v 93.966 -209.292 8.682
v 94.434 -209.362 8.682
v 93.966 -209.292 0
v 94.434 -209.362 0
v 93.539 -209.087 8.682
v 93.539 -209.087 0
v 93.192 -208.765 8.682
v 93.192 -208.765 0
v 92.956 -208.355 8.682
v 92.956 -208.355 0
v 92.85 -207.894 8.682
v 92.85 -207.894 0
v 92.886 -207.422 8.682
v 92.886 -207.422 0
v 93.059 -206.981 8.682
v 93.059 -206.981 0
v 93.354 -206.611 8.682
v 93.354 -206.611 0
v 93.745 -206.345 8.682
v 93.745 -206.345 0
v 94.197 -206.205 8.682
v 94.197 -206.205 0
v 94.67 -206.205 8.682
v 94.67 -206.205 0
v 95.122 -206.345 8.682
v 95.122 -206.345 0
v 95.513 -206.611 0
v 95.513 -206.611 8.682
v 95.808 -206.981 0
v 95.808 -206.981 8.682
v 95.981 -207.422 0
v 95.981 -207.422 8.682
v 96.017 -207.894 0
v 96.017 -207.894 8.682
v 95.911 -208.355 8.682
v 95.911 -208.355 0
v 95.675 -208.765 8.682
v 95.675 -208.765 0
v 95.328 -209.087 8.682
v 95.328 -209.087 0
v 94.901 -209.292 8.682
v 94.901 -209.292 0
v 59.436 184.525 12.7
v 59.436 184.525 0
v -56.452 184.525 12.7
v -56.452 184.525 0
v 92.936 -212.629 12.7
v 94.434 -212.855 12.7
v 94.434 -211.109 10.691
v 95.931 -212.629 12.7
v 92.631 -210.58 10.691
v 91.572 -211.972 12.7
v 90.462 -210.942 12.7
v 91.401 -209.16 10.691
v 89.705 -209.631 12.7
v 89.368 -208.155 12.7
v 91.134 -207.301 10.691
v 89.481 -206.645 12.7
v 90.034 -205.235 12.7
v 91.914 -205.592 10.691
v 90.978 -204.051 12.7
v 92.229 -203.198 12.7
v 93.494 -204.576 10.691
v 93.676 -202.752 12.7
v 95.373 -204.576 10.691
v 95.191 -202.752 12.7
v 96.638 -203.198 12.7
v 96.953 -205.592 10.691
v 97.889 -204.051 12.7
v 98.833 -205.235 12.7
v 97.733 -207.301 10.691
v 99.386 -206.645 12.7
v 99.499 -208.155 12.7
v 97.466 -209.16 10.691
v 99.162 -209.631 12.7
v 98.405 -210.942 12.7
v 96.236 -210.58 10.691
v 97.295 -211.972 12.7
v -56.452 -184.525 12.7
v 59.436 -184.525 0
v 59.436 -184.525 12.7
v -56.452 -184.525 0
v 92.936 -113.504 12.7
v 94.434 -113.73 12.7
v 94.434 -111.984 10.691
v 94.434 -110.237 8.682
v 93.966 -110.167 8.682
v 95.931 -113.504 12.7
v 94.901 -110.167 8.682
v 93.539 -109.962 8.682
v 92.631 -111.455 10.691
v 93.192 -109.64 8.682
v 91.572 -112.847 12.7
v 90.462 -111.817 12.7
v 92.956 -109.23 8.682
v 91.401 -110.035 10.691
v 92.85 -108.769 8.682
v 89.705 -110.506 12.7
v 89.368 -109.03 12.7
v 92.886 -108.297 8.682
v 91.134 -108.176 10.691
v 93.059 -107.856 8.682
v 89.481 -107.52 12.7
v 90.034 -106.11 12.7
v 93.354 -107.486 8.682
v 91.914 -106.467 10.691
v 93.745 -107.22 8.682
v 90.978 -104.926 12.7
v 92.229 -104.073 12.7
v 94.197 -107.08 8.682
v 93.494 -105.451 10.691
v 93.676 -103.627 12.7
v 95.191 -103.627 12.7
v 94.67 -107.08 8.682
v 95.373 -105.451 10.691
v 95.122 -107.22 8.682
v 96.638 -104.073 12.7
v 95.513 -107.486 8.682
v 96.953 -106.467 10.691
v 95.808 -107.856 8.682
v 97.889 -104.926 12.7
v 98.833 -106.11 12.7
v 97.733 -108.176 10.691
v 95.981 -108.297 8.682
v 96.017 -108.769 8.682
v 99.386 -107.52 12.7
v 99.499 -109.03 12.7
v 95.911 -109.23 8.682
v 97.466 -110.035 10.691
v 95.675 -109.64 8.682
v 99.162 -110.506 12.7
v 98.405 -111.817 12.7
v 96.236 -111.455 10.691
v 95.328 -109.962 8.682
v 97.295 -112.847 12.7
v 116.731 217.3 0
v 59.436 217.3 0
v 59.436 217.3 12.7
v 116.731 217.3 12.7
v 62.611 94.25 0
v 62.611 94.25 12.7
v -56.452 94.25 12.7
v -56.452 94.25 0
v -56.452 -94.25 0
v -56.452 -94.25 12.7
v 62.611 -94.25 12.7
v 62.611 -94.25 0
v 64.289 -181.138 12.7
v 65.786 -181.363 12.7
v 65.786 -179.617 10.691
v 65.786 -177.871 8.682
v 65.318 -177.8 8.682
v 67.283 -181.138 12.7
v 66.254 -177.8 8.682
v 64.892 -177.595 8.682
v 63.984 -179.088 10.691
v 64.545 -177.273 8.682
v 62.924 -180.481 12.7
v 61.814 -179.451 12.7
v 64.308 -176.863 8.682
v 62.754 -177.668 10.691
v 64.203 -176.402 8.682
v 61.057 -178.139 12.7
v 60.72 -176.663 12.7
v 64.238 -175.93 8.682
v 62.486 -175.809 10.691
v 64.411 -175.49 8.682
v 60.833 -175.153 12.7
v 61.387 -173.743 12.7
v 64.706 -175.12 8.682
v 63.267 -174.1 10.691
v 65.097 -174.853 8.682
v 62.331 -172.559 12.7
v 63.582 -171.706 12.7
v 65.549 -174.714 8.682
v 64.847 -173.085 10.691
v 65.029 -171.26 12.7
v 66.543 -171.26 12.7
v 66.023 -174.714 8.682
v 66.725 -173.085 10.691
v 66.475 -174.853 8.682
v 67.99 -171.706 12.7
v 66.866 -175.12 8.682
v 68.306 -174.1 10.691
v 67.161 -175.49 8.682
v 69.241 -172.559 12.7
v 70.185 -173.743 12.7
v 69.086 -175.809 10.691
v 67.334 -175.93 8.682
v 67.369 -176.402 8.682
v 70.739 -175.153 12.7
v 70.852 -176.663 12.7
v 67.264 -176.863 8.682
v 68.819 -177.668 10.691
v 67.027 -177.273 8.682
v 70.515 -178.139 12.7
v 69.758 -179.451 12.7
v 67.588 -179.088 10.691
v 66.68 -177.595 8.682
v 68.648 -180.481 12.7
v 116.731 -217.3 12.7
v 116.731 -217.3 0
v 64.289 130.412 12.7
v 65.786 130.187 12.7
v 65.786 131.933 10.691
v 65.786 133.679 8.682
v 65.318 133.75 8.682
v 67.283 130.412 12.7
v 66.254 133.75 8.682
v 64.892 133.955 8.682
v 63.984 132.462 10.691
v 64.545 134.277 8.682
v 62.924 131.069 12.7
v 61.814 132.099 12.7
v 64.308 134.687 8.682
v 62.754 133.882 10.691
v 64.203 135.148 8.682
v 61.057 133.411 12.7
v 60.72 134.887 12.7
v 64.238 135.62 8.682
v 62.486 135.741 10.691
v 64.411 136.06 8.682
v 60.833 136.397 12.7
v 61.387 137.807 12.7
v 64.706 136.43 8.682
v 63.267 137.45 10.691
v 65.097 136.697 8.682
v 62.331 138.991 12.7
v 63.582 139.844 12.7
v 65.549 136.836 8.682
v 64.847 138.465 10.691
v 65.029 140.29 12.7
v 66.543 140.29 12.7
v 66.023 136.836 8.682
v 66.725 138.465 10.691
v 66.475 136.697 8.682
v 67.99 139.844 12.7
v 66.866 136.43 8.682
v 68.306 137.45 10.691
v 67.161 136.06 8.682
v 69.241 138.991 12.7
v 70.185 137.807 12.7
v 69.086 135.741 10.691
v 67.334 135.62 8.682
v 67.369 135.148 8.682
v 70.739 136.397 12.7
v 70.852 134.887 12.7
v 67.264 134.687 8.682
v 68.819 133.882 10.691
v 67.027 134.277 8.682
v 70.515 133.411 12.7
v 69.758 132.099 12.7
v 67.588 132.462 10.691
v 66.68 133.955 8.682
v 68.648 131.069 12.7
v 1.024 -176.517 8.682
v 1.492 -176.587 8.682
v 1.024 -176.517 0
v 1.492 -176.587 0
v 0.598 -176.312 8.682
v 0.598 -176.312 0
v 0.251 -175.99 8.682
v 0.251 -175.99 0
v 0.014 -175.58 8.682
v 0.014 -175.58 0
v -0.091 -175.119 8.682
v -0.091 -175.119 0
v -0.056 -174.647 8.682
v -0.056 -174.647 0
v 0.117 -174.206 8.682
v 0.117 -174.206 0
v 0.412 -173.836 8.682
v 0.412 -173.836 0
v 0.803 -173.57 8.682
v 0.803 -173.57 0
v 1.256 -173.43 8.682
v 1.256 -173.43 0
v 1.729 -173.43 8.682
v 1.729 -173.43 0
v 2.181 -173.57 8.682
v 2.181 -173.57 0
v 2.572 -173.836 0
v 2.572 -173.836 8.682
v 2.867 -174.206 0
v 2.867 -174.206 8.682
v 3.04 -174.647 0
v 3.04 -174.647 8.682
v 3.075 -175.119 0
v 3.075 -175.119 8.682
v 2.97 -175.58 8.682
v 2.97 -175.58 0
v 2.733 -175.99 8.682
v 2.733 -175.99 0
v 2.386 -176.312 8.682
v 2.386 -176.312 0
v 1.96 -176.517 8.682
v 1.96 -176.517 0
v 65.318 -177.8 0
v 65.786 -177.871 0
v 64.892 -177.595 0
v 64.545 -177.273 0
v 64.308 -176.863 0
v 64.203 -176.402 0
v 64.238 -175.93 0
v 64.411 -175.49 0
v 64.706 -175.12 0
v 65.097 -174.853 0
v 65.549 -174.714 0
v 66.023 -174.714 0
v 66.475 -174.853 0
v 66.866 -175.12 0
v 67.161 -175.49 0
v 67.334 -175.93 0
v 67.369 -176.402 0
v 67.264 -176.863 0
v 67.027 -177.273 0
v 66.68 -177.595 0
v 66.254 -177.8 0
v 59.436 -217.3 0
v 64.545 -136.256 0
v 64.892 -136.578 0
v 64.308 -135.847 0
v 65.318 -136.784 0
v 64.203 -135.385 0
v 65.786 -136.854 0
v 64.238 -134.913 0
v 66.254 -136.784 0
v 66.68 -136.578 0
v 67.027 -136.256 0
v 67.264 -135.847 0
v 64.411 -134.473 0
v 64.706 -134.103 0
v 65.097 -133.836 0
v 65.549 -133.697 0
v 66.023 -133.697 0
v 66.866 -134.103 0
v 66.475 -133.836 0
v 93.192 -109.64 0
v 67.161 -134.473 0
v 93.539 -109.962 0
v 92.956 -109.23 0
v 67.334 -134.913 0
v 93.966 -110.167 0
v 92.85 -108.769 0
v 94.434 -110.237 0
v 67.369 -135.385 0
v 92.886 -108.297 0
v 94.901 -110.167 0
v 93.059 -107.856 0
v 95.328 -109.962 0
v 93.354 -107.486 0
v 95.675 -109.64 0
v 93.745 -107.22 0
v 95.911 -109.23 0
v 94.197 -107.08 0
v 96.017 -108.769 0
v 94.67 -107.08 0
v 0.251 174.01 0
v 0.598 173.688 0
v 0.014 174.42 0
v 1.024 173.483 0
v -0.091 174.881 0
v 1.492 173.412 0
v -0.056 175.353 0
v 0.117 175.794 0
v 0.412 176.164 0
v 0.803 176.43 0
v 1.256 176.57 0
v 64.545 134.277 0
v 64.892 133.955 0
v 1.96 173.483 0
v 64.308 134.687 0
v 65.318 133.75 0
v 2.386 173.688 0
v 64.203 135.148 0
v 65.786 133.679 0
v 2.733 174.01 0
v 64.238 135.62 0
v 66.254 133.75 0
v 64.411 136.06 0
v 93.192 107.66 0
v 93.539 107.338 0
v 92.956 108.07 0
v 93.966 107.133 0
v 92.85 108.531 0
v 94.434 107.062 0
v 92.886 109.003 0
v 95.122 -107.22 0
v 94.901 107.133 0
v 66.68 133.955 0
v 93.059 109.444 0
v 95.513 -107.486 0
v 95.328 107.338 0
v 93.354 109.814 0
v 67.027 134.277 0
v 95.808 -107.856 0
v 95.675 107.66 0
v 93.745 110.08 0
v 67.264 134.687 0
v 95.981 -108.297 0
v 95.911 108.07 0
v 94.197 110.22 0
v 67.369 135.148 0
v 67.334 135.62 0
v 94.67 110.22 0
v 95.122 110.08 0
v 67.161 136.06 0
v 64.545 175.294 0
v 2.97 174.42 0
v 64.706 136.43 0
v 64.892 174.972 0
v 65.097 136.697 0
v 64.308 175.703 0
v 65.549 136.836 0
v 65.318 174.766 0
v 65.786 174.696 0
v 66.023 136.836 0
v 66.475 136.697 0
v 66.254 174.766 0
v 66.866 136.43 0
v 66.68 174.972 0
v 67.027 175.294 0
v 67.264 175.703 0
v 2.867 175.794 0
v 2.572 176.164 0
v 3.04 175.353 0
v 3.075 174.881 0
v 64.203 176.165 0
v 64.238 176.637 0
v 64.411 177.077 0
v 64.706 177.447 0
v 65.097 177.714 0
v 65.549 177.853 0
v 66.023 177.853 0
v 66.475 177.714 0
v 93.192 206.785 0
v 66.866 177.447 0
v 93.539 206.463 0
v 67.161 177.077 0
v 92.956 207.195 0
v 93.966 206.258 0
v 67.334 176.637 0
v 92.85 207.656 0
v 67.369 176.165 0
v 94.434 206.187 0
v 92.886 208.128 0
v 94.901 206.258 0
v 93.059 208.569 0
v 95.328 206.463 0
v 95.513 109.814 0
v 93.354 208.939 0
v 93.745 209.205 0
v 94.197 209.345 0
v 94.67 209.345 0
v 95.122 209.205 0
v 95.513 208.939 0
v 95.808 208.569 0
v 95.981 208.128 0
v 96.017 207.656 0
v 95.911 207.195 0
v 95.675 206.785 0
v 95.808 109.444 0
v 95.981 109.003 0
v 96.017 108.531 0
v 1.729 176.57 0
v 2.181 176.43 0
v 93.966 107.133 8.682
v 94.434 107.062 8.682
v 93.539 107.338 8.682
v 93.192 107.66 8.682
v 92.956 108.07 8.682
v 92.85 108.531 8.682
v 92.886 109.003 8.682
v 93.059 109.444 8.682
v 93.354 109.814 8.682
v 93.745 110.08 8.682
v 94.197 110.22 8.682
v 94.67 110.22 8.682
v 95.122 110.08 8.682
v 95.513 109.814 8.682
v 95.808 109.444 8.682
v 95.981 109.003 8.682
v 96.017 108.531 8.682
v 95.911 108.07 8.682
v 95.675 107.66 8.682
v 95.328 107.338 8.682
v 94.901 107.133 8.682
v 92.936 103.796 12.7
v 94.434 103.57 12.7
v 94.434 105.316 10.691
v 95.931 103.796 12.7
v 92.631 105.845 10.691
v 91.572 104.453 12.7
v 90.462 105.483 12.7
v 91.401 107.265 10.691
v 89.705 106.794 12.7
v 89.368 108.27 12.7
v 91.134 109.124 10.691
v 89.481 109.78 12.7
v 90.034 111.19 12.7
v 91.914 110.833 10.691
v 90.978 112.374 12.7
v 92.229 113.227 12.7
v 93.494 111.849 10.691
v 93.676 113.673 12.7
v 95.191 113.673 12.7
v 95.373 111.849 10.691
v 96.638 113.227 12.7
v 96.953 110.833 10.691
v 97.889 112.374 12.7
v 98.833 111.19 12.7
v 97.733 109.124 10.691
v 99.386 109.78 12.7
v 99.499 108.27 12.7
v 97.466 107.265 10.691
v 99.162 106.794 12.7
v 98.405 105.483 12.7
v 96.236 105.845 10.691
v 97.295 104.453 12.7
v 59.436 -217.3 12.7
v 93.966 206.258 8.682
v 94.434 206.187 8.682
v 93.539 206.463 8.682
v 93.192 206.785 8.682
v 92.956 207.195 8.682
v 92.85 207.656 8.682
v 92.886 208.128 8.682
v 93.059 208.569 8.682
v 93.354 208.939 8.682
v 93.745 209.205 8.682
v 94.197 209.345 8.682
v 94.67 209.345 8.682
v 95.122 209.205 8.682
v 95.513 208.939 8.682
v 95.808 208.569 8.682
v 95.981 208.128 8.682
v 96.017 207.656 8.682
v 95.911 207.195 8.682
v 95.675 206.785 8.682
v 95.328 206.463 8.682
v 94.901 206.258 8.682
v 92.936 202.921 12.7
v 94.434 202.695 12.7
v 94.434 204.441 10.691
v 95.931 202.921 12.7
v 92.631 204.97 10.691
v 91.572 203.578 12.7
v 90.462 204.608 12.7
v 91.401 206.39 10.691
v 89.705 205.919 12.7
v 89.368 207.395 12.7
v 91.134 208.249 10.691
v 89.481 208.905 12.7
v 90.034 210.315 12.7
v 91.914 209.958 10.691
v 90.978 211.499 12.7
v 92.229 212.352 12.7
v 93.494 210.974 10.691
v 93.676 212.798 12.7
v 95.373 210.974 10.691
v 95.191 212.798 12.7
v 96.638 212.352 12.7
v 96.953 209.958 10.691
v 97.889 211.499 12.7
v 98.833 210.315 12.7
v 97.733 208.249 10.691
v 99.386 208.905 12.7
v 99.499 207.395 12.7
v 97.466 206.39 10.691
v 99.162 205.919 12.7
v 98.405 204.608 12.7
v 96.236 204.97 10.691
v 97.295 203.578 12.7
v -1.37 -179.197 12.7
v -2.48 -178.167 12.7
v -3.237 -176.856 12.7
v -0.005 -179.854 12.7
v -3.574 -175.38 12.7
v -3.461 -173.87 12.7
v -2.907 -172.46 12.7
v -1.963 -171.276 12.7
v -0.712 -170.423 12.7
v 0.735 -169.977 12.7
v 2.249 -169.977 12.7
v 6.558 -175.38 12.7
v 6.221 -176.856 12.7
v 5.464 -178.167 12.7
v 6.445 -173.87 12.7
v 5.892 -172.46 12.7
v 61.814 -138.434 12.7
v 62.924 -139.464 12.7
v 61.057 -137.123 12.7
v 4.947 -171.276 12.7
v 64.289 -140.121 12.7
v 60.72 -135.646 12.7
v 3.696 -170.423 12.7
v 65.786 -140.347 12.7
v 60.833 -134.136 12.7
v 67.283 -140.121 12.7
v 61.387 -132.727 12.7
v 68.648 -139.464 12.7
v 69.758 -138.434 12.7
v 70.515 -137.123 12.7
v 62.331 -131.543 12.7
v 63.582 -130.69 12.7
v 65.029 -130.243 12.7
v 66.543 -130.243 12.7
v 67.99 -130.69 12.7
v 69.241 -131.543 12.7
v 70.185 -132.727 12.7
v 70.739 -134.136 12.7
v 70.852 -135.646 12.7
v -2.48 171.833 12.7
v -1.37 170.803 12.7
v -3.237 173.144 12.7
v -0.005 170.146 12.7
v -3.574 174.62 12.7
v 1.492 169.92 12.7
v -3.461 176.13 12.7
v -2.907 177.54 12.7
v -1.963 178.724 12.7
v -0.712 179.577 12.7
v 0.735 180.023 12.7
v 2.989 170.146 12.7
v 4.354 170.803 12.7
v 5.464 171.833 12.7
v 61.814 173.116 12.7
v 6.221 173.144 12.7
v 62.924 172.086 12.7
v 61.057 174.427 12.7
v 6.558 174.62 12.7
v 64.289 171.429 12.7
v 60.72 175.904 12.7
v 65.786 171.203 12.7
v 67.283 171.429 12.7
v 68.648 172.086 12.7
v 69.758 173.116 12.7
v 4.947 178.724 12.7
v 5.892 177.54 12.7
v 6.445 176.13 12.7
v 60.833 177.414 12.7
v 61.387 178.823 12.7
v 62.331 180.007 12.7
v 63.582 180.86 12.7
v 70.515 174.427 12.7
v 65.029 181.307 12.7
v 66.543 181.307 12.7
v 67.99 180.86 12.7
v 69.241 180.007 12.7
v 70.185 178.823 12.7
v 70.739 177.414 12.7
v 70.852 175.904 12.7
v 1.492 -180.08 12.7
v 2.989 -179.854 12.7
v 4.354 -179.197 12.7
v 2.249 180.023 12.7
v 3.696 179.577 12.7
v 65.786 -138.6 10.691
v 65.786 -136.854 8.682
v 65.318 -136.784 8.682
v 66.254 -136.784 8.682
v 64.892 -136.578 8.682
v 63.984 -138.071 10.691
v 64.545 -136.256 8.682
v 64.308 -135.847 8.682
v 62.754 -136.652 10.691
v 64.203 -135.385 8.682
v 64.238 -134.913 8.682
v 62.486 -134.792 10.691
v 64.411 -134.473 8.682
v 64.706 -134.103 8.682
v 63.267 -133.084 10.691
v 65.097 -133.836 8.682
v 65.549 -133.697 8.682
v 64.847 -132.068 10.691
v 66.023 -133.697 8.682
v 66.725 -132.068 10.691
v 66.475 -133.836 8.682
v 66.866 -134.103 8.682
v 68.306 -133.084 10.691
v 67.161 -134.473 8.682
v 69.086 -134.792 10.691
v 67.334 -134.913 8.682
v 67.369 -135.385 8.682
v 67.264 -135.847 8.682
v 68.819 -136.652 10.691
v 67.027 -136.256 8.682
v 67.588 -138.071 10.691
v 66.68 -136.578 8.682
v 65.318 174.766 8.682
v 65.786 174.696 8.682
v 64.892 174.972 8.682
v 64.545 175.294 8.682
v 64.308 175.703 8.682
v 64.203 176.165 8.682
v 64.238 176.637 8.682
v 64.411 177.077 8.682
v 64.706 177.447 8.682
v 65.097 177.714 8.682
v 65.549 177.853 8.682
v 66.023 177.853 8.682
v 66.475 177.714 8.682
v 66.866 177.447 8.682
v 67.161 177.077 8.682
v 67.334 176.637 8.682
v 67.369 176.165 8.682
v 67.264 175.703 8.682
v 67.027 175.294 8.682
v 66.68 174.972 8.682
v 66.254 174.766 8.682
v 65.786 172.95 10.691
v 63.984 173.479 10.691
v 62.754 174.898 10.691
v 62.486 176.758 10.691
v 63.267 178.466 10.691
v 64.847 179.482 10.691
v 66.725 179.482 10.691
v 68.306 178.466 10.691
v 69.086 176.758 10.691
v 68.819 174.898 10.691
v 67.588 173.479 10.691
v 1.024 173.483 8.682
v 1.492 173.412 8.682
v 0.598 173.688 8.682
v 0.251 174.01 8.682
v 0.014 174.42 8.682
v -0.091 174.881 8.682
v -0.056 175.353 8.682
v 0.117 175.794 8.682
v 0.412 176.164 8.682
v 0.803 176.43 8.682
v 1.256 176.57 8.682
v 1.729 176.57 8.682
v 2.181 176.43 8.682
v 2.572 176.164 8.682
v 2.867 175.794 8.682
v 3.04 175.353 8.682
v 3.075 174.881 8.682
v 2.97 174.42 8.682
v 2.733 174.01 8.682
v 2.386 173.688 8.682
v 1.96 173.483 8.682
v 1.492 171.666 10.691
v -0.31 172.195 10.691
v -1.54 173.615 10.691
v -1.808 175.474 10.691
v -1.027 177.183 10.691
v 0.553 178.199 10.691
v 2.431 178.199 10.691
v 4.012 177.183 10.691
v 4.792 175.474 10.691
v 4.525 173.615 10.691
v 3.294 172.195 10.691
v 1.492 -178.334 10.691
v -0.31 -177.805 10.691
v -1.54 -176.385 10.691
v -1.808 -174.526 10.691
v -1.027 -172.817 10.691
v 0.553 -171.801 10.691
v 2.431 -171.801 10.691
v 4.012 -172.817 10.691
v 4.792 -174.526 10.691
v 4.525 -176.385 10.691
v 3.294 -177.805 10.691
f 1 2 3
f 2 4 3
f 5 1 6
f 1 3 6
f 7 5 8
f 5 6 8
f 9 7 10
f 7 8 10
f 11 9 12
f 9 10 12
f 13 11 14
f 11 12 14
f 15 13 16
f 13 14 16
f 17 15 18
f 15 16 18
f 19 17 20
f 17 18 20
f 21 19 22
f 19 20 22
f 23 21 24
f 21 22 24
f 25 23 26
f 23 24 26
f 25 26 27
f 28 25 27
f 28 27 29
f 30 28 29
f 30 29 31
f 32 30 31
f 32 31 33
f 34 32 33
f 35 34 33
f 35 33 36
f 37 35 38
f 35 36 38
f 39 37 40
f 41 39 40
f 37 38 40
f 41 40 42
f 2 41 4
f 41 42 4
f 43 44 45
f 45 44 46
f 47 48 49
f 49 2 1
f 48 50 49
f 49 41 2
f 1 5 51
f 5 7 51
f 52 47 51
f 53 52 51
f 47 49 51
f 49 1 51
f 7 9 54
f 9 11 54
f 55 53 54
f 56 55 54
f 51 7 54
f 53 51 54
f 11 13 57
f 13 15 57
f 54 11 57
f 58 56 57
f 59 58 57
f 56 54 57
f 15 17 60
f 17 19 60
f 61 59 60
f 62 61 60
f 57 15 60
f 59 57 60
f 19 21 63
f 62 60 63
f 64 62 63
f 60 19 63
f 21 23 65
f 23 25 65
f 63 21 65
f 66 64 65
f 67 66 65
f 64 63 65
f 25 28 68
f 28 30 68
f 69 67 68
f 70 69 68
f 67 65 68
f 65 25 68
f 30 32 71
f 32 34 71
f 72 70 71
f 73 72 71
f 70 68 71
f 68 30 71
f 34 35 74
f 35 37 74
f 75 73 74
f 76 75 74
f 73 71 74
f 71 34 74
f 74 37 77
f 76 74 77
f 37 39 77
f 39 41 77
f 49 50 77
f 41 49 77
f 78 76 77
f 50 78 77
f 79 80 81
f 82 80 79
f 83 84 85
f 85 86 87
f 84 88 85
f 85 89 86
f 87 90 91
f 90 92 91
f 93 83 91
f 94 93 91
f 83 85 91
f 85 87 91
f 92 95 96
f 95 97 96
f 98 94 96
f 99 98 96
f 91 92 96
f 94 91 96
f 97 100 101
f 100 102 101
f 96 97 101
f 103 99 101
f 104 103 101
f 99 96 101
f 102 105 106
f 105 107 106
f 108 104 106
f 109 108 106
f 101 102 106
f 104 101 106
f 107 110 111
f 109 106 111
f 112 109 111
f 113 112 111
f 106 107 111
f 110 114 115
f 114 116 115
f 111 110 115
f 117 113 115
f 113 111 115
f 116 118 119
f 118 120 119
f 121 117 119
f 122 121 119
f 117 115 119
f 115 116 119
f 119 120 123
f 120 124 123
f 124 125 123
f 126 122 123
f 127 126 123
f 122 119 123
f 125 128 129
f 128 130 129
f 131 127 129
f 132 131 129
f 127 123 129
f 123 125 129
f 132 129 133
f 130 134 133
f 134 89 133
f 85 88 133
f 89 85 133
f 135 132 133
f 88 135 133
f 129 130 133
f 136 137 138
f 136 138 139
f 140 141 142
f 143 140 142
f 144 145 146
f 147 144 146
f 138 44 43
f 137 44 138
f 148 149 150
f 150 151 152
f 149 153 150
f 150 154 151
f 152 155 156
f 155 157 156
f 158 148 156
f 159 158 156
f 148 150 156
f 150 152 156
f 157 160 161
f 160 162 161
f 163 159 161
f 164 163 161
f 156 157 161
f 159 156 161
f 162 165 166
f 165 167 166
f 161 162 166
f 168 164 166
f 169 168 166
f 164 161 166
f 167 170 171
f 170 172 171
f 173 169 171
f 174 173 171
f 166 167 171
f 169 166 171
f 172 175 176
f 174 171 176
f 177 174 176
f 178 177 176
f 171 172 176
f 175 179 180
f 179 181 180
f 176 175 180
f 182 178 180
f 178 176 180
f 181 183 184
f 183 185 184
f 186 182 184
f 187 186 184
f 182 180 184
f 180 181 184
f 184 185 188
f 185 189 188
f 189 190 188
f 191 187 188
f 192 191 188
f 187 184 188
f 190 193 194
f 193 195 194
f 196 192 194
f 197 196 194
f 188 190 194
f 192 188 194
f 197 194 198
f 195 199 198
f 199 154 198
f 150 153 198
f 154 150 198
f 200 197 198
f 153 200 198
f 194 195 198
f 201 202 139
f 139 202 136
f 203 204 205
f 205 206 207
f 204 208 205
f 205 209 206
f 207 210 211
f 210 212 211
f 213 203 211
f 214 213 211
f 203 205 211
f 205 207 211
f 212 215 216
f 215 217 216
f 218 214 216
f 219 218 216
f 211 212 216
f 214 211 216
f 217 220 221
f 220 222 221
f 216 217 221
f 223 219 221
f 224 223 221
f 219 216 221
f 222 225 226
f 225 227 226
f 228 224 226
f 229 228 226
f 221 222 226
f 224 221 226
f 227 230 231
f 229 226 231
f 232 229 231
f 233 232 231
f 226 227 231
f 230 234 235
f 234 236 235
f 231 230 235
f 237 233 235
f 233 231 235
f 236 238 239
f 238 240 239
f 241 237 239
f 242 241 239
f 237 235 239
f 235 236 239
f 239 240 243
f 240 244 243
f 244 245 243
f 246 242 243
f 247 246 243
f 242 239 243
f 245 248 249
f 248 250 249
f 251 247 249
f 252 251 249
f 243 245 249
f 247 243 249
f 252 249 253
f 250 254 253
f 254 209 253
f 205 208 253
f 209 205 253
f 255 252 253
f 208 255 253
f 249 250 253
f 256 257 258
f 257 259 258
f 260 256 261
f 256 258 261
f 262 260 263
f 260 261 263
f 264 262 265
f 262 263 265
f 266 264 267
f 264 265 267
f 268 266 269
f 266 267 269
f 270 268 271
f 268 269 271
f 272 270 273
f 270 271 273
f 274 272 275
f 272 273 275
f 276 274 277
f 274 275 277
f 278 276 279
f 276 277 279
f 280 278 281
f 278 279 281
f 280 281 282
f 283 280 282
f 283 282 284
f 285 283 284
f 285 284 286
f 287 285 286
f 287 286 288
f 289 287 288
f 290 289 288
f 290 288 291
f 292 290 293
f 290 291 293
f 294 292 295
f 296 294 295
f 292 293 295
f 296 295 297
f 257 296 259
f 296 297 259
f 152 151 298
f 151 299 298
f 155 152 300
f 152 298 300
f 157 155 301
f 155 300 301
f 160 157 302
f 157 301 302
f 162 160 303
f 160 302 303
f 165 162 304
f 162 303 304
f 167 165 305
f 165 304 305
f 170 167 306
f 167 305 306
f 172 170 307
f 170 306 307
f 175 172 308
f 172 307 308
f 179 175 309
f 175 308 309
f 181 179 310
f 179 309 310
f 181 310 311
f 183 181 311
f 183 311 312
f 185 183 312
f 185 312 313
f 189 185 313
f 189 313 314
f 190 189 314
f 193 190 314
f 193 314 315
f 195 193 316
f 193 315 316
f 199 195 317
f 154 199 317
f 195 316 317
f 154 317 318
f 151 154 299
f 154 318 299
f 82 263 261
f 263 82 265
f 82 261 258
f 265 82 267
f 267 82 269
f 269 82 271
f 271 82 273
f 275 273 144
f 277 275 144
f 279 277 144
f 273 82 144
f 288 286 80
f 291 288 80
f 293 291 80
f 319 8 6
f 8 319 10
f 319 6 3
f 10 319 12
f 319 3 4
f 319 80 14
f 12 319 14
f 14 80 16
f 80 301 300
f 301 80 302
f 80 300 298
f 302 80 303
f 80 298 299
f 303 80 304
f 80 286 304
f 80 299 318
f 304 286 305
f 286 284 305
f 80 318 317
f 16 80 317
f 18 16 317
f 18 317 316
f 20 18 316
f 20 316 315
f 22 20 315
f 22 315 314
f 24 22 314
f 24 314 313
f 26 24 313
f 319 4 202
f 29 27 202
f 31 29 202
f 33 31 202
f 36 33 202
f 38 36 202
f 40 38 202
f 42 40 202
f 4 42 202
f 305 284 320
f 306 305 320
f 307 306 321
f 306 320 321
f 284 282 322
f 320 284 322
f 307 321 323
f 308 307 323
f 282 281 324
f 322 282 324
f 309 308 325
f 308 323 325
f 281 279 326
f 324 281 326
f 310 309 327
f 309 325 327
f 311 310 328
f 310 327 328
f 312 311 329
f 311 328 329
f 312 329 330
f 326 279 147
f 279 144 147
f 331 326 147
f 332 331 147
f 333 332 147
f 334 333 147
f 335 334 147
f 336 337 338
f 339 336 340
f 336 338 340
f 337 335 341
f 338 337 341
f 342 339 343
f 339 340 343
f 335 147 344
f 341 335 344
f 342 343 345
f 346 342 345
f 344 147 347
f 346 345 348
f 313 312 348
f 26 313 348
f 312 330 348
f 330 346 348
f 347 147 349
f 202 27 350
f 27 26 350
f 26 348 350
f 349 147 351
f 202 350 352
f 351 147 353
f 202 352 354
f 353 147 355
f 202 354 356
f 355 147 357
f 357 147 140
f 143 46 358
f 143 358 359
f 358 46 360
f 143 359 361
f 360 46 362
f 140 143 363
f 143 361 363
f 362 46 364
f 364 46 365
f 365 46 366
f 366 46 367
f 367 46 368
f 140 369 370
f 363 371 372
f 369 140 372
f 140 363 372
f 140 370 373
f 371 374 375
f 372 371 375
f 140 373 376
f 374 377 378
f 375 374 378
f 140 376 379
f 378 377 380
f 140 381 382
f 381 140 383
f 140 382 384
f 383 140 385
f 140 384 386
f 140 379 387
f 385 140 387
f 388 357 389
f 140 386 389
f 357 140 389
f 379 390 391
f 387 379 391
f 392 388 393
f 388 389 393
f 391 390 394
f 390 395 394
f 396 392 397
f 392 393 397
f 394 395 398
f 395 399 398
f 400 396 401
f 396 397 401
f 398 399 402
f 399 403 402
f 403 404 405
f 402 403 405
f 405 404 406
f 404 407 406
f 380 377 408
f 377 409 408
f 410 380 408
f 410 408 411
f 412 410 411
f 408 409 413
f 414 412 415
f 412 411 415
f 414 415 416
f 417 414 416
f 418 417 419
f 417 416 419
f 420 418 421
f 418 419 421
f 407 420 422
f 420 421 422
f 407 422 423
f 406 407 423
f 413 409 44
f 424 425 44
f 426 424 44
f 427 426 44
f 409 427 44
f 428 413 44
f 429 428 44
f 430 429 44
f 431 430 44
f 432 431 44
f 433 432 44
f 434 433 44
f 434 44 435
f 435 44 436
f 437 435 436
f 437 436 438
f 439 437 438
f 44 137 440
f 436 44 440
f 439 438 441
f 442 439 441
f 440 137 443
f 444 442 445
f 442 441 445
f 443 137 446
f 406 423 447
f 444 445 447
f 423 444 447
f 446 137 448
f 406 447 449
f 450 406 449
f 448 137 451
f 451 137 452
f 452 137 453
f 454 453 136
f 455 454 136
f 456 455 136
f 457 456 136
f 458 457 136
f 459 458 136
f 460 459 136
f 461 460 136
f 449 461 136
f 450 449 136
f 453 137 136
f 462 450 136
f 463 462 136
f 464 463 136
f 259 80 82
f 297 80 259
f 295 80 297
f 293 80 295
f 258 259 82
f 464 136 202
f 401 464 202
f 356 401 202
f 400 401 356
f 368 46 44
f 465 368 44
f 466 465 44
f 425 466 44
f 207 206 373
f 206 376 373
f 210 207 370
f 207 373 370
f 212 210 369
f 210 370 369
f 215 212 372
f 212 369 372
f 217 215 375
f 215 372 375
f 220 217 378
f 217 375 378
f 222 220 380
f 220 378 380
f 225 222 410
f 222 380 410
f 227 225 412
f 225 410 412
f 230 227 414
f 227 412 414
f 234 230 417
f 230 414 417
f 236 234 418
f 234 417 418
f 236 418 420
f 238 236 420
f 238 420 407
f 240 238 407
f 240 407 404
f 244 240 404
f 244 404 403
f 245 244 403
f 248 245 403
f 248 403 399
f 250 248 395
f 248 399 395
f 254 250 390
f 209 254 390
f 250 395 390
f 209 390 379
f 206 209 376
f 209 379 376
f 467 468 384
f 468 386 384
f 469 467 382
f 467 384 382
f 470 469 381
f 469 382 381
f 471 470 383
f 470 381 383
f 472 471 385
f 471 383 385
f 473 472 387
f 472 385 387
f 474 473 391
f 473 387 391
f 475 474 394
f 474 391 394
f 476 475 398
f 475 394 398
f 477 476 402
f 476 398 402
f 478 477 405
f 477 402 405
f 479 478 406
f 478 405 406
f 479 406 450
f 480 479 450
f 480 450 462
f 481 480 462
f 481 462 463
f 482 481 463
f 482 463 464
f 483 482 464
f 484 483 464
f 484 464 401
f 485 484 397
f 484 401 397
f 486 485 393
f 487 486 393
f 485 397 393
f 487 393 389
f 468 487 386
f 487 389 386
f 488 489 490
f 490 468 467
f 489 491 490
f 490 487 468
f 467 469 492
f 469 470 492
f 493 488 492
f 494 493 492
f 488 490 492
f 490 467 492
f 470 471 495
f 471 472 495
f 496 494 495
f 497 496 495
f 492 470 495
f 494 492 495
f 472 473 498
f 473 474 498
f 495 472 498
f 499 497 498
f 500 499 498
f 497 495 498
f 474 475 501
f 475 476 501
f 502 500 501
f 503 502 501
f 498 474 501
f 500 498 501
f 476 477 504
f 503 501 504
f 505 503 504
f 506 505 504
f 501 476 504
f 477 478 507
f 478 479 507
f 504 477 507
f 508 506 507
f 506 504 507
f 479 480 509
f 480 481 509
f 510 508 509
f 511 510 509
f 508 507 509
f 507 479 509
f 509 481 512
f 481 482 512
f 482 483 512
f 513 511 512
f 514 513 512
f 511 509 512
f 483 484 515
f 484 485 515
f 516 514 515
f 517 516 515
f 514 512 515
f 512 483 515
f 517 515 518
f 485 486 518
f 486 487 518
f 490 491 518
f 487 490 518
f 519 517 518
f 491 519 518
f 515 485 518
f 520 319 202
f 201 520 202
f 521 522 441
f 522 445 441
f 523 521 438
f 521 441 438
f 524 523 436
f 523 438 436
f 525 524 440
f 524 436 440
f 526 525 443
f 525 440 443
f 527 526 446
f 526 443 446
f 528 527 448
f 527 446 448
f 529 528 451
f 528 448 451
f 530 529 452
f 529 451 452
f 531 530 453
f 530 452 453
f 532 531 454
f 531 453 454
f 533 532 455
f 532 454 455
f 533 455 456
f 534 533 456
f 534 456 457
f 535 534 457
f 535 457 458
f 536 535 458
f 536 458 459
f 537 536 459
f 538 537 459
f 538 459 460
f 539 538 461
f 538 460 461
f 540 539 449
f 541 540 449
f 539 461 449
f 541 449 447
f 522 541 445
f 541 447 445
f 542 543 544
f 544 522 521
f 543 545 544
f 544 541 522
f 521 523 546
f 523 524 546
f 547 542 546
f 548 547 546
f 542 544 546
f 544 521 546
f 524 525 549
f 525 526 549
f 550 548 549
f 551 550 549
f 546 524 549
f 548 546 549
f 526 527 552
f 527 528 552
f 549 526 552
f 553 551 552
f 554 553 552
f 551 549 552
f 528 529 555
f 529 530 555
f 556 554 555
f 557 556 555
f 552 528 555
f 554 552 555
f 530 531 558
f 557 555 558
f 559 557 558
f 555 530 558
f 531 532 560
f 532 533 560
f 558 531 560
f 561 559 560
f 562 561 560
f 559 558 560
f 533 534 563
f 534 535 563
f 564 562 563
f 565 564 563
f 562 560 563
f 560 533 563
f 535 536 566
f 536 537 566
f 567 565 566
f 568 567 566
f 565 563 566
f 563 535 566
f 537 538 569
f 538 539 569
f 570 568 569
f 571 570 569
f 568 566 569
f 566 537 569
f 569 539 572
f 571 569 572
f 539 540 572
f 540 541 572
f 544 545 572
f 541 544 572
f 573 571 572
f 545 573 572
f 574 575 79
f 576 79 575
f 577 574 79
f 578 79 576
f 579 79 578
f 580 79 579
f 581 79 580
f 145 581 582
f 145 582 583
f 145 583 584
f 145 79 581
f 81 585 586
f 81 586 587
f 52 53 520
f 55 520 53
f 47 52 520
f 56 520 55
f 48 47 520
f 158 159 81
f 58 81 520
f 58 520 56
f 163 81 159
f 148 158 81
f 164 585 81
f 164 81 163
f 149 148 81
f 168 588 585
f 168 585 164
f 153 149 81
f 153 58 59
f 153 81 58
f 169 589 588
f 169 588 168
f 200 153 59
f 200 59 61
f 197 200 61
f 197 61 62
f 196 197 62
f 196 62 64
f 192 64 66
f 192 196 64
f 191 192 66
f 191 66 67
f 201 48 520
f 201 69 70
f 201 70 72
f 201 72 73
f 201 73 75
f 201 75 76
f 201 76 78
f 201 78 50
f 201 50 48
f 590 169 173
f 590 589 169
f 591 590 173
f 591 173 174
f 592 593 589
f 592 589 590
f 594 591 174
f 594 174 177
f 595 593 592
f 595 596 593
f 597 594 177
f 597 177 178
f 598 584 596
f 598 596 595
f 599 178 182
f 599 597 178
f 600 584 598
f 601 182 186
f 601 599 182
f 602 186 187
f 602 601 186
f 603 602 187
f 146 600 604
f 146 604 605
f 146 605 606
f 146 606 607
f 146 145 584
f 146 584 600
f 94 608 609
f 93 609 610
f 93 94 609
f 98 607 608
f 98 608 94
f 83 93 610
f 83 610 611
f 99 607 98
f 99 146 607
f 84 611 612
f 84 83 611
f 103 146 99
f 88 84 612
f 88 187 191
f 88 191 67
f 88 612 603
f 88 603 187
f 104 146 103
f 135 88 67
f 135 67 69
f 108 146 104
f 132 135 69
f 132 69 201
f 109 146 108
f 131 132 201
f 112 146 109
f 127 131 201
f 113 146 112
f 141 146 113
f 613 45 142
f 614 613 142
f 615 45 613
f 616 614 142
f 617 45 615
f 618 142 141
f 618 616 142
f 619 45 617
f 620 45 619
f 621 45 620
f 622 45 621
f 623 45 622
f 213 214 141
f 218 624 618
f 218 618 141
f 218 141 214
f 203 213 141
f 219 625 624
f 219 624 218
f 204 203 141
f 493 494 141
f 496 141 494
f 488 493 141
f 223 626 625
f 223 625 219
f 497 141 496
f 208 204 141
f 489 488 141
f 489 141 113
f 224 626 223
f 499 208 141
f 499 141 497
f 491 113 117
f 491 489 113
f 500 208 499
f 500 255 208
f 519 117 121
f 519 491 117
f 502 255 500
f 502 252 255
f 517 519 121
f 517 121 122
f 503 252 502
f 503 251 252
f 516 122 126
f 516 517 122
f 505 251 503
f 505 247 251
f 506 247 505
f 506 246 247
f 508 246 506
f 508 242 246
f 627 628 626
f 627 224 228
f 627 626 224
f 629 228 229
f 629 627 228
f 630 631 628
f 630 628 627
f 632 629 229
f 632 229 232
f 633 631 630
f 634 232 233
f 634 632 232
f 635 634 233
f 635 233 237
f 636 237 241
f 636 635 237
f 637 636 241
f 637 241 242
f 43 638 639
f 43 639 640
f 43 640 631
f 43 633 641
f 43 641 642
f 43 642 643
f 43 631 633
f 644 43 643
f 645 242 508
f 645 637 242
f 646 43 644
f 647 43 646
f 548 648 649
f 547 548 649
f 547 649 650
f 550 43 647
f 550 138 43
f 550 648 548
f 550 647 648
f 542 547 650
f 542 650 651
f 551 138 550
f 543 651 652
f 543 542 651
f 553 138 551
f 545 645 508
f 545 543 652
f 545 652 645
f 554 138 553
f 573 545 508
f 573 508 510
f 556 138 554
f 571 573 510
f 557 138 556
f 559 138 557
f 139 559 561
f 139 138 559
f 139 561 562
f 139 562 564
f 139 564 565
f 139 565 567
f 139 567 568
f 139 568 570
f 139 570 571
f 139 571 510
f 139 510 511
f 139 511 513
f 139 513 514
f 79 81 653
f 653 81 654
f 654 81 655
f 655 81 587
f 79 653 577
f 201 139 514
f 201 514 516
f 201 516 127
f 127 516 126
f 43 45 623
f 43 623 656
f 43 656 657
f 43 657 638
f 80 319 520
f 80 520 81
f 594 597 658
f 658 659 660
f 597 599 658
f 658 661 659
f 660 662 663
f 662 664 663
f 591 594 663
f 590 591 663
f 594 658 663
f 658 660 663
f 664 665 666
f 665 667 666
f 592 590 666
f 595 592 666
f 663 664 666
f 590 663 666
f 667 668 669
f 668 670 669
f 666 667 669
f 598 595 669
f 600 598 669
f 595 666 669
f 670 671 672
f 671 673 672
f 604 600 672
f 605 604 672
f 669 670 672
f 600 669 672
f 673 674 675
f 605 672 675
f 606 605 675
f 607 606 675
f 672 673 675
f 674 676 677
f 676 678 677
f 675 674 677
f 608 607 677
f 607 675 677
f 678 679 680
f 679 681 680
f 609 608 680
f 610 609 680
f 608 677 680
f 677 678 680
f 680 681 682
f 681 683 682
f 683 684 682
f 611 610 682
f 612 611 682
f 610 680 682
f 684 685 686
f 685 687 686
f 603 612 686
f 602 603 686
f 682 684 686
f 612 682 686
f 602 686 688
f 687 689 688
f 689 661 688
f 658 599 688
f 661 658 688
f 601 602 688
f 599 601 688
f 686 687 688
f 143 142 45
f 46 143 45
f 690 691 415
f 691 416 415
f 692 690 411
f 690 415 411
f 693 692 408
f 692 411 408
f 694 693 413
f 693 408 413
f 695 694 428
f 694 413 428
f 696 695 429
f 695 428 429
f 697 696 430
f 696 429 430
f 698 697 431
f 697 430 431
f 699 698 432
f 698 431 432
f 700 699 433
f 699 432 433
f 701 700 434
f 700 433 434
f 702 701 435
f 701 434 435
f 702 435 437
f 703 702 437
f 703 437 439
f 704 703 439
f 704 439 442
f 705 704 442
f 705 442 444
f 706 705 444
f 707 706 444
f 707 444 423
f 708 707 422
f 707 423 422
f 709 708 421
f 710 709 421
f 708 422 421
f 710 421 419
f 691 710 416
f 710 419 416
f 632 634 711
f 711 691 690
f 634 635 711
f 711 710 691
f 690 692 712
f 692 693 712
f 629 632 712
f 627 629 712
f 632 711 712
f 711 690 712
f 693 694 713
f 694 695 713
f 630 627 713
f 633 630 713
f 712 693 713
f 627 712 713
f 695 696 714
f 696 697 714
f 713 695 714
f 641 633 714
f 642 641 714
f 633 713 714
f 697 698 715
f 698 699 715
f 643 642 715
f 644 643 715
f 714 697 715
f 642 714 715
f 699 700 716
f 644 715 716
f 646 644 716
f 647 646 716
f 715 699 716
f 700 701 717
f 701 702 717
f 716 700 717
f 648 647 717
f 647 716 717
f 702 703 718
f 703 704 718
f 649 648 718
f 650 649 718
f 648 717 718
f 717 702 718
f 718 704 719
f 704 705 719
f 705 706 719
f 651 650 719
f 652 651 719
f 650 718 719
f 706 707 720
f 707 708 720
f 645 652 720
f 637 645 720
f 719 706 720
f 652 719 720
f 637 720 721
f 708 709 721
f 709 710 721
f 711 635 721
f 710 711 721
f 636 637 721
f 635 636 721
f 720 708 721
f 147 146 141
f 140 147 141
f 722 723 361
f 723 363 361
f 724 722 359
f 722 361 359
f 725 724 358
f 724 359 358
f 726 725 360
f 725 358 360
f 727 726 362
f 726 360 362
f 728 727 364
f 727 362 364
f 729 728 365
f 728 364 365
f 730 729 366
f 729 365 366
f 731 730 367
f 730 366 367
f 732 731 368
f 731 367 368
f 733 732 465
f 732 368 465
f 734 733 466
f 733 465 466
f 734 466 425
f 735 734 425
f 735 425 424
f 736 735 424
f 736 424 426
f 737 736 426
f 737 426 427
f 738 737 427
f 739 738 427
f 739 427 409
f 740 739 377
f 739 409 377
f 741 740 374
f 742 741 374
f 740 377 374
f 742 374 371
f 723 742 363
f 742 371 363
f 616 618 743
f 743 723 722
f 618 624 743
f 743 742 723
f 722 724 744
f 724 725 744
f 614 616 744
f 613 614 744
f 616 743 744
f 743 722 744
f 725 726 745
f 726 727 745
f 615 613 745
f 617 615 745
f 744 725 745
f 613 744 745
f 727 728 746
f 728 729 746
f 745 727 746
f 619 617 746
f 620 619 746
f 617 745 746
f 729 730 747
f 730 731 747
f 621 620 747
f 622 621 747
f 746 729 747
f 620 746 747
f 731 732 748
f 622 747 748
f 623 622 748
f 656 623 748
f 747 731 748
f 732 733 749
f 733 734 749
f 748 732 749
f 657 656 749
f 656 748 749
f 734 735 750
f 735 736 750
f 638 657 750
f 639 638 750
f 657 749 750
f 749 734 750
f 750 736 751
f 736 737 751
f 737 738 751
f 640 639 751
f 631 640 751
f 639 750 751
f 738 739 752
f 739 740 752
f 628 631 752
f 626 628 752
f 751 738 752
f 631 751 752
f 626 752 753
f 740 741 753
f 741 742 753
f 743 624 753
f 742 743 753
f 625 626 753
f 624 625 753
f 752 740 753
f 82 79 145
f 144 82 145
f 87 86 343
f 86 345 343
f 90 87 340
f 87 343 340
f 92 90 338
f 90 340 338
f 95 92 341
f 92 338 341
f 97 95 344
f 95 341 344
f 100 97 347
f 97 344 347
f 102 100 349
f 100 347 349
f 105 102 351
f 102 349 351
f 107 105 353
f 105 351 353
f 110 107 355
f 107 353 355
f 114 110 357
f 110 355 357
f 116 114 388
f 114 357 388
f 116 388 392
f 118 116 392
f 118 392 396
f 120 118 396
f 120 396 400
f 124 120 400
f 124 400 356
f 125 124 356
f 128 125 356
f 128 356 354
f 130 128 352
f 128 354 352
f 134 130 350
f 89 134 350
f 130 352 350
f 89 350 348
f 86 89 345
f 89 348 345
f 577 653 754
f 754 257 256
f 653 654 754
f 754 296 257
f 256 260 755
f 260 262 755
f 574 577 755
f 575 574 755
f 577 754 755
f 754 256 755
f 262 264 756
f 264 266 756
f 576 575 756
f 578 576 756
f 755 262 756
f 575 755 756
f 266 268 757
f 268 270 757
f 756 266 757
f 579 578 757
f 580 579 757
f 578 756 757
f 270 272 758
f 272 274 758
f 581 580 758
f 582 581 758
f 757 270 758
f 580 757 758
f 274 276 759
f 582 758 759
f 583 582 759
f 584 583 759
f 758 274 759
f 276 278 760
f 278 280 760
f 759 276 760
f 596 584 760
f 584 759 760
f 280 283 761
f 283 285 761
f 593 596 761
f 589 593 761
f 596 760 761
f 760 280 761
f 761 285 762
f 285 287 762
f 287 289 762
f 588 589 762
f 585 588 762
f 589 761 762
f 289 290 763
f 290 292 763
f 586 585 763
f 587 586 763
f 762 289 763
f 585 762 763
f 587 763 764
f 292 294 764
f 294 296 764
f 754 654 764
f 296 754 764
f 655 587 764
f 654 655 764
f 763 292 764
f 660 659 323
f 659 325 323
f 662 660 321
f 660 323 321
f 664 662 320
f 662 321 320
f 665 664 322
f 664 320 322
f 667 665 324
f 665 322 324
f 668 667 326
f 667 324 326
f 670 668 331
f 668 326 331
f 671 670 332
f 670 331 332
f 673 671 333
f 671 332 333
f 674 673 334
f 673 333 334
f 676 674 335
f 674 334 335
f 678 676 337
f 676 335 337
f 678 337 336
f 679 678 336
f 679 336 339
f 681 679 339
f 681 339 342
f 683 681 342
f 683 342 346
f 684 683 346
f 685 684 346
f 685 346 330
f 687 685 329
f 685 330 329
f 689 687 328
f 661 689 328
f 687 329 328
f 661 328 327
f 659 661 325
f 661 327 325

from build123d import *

# Parameters (mm, degrees)
SKETCH1_W           = 198.582793441
SKETCH1_H           = 434.599999988
BOSS_EXTRUDE1_DEPTH = 12.7
CUT_EXTRUDE1_REACH  = 14.7
SKETCH2_W           = 141.287862113
SKETCH2_H           = 32.775
CUT_EXTRUDE2_REACH  = 14.7
HOLE1_D             = 3.175
HOLE1_DEPTH         = 38.1
HOLE1_CSINK_D       = 10.16
HOLE1_CSINK_ANGLE   = 82
HOLE1_TIP           = 0.953866233


with BuildPart() as part:
    # Sketch1 → Boss-Extrude1 (new body)
    with BuildSketch(Plane.XY):
        with Locations((17.439596016, 0)):
            Rectangle(SKETCH1_W, SKETCH1_H)
    extrude(amount=BOSS_EXTRUDE1_DEPTH)

    # Sketch2 → Cut-Extrude1 (cut, up to next)
    with BuildSketch(Plane(origin=(0, 0, 0), x_dir=(-1, 0, 0), z_dir=(0, 0, -1)), mode=Mode.PRIVATE) as cut_extrude1_sk1:
        with Locations((11.207869649, 200.912499994)):
            Rectangle(SKETCH2_W, SKETCH2_H)
    cut_extrude1_tool1 = extrude(cut_extrude1_sk1.sketch, amount=-CUT_EXTRUDE1_REACH, mode=Mode.PRIVATE) & part.part
    add(cut_extrude1_tool1.solids().sort_by_distance((-11.20787, 200.9125, 0))[0], mode=Mode.SUBTRACT)
    # Sketch2 → Cut-Extrude1 (cut, up to next)
    with BuildSketch(Plane(origin=(0, 0, 0), x_dir=(-1, 0, 0), z_dir=(0, 0, -1)), mode=Mode.PRIVATE) as cut_extrude1_sk2:
        with Locations((11.207869649, -200.912499994)):
            Rectangle(SKETCH2_W, SKETCH2_H)
    cut_extrude1_tool2 = extrude(cut_extrude1_sk2.sketch, amount=-CUT_EXTRUDE1_REACH, mode=Mode.PRIVATE) & part.part
    add(cut_extrude1_tool2.solids().sort_by_distance((-11.20787, -200.9125, 0))[0], mode=Mode.SUBTRACT)

    # Sketch3 → Cut-Extrude2 (cut, up to next)
    with BuildSketch(Plane.XY.offset(12.7), mode=Mode.PRIVATE) as cut_extrude2_sk1:
        Polygon((62.611061408, 94.249999997), (-56.451800705, 94.249999997), (-56.451800705, 184.524999994), (-81.851800705, 184.524999994), (-81.851800705, 94.249999997), (-85.026800705, 94.249999997), (-85.026800705, -94.249999997), (-81.851800705, -94.249999997), (-81.851800705, -184.524999994), (-56.451800705, -184.524999994), (-56.451800705, -94.249999997), (62.611061408, -94.249999997), align=None)
    cut_extrude2_tool1 = extrude(cut_extrude2_sk1.sketch, amount=-CUT_EXTRUDE2_REACH, mode=Mode.PRIVATE) & part.part
    add(cut_extrude2_tool1.solids().sort_by_distance((-19.405412, 0, 12.7))[0], mode=Mode.SUBTRACT)

    # Hole1
    with Locations(Plane(origin=(449.828463103, 0, 12.7), x_dir=(0, 1, 0), z_dir=(0, 0, 1))):
        with Locations((-108.649999997, 355.39493603), (108.649999997, 355.39493603), (207.774999994, 355.39493603), (174.999999994, 448.336332751), (135.266666663, 384.042401694), (176.283333328, 384.042401694), (-174.999999994, 448.336332751), (-135.266666663, 384.042401694), (-176.283333328, 384.042401694), (-207.774999994, 355.39493603)):
            CounterSinkHole(HOLE1_D / 2, HOLE1_CSINK_D / 2, depth=HOLE1_DEPTH, counter_sink_angle=HOLE1_CSINK_ANGLE)
            with Locations((0, 0, -(HOLE1_DEPTH + HOLE1_TIP / 2))):  # 118° drill point
                Cone(0, HOLE1_D / 2, HOLE1_TIP, mode=Mode.SUBTRACT)


solid = part.part
